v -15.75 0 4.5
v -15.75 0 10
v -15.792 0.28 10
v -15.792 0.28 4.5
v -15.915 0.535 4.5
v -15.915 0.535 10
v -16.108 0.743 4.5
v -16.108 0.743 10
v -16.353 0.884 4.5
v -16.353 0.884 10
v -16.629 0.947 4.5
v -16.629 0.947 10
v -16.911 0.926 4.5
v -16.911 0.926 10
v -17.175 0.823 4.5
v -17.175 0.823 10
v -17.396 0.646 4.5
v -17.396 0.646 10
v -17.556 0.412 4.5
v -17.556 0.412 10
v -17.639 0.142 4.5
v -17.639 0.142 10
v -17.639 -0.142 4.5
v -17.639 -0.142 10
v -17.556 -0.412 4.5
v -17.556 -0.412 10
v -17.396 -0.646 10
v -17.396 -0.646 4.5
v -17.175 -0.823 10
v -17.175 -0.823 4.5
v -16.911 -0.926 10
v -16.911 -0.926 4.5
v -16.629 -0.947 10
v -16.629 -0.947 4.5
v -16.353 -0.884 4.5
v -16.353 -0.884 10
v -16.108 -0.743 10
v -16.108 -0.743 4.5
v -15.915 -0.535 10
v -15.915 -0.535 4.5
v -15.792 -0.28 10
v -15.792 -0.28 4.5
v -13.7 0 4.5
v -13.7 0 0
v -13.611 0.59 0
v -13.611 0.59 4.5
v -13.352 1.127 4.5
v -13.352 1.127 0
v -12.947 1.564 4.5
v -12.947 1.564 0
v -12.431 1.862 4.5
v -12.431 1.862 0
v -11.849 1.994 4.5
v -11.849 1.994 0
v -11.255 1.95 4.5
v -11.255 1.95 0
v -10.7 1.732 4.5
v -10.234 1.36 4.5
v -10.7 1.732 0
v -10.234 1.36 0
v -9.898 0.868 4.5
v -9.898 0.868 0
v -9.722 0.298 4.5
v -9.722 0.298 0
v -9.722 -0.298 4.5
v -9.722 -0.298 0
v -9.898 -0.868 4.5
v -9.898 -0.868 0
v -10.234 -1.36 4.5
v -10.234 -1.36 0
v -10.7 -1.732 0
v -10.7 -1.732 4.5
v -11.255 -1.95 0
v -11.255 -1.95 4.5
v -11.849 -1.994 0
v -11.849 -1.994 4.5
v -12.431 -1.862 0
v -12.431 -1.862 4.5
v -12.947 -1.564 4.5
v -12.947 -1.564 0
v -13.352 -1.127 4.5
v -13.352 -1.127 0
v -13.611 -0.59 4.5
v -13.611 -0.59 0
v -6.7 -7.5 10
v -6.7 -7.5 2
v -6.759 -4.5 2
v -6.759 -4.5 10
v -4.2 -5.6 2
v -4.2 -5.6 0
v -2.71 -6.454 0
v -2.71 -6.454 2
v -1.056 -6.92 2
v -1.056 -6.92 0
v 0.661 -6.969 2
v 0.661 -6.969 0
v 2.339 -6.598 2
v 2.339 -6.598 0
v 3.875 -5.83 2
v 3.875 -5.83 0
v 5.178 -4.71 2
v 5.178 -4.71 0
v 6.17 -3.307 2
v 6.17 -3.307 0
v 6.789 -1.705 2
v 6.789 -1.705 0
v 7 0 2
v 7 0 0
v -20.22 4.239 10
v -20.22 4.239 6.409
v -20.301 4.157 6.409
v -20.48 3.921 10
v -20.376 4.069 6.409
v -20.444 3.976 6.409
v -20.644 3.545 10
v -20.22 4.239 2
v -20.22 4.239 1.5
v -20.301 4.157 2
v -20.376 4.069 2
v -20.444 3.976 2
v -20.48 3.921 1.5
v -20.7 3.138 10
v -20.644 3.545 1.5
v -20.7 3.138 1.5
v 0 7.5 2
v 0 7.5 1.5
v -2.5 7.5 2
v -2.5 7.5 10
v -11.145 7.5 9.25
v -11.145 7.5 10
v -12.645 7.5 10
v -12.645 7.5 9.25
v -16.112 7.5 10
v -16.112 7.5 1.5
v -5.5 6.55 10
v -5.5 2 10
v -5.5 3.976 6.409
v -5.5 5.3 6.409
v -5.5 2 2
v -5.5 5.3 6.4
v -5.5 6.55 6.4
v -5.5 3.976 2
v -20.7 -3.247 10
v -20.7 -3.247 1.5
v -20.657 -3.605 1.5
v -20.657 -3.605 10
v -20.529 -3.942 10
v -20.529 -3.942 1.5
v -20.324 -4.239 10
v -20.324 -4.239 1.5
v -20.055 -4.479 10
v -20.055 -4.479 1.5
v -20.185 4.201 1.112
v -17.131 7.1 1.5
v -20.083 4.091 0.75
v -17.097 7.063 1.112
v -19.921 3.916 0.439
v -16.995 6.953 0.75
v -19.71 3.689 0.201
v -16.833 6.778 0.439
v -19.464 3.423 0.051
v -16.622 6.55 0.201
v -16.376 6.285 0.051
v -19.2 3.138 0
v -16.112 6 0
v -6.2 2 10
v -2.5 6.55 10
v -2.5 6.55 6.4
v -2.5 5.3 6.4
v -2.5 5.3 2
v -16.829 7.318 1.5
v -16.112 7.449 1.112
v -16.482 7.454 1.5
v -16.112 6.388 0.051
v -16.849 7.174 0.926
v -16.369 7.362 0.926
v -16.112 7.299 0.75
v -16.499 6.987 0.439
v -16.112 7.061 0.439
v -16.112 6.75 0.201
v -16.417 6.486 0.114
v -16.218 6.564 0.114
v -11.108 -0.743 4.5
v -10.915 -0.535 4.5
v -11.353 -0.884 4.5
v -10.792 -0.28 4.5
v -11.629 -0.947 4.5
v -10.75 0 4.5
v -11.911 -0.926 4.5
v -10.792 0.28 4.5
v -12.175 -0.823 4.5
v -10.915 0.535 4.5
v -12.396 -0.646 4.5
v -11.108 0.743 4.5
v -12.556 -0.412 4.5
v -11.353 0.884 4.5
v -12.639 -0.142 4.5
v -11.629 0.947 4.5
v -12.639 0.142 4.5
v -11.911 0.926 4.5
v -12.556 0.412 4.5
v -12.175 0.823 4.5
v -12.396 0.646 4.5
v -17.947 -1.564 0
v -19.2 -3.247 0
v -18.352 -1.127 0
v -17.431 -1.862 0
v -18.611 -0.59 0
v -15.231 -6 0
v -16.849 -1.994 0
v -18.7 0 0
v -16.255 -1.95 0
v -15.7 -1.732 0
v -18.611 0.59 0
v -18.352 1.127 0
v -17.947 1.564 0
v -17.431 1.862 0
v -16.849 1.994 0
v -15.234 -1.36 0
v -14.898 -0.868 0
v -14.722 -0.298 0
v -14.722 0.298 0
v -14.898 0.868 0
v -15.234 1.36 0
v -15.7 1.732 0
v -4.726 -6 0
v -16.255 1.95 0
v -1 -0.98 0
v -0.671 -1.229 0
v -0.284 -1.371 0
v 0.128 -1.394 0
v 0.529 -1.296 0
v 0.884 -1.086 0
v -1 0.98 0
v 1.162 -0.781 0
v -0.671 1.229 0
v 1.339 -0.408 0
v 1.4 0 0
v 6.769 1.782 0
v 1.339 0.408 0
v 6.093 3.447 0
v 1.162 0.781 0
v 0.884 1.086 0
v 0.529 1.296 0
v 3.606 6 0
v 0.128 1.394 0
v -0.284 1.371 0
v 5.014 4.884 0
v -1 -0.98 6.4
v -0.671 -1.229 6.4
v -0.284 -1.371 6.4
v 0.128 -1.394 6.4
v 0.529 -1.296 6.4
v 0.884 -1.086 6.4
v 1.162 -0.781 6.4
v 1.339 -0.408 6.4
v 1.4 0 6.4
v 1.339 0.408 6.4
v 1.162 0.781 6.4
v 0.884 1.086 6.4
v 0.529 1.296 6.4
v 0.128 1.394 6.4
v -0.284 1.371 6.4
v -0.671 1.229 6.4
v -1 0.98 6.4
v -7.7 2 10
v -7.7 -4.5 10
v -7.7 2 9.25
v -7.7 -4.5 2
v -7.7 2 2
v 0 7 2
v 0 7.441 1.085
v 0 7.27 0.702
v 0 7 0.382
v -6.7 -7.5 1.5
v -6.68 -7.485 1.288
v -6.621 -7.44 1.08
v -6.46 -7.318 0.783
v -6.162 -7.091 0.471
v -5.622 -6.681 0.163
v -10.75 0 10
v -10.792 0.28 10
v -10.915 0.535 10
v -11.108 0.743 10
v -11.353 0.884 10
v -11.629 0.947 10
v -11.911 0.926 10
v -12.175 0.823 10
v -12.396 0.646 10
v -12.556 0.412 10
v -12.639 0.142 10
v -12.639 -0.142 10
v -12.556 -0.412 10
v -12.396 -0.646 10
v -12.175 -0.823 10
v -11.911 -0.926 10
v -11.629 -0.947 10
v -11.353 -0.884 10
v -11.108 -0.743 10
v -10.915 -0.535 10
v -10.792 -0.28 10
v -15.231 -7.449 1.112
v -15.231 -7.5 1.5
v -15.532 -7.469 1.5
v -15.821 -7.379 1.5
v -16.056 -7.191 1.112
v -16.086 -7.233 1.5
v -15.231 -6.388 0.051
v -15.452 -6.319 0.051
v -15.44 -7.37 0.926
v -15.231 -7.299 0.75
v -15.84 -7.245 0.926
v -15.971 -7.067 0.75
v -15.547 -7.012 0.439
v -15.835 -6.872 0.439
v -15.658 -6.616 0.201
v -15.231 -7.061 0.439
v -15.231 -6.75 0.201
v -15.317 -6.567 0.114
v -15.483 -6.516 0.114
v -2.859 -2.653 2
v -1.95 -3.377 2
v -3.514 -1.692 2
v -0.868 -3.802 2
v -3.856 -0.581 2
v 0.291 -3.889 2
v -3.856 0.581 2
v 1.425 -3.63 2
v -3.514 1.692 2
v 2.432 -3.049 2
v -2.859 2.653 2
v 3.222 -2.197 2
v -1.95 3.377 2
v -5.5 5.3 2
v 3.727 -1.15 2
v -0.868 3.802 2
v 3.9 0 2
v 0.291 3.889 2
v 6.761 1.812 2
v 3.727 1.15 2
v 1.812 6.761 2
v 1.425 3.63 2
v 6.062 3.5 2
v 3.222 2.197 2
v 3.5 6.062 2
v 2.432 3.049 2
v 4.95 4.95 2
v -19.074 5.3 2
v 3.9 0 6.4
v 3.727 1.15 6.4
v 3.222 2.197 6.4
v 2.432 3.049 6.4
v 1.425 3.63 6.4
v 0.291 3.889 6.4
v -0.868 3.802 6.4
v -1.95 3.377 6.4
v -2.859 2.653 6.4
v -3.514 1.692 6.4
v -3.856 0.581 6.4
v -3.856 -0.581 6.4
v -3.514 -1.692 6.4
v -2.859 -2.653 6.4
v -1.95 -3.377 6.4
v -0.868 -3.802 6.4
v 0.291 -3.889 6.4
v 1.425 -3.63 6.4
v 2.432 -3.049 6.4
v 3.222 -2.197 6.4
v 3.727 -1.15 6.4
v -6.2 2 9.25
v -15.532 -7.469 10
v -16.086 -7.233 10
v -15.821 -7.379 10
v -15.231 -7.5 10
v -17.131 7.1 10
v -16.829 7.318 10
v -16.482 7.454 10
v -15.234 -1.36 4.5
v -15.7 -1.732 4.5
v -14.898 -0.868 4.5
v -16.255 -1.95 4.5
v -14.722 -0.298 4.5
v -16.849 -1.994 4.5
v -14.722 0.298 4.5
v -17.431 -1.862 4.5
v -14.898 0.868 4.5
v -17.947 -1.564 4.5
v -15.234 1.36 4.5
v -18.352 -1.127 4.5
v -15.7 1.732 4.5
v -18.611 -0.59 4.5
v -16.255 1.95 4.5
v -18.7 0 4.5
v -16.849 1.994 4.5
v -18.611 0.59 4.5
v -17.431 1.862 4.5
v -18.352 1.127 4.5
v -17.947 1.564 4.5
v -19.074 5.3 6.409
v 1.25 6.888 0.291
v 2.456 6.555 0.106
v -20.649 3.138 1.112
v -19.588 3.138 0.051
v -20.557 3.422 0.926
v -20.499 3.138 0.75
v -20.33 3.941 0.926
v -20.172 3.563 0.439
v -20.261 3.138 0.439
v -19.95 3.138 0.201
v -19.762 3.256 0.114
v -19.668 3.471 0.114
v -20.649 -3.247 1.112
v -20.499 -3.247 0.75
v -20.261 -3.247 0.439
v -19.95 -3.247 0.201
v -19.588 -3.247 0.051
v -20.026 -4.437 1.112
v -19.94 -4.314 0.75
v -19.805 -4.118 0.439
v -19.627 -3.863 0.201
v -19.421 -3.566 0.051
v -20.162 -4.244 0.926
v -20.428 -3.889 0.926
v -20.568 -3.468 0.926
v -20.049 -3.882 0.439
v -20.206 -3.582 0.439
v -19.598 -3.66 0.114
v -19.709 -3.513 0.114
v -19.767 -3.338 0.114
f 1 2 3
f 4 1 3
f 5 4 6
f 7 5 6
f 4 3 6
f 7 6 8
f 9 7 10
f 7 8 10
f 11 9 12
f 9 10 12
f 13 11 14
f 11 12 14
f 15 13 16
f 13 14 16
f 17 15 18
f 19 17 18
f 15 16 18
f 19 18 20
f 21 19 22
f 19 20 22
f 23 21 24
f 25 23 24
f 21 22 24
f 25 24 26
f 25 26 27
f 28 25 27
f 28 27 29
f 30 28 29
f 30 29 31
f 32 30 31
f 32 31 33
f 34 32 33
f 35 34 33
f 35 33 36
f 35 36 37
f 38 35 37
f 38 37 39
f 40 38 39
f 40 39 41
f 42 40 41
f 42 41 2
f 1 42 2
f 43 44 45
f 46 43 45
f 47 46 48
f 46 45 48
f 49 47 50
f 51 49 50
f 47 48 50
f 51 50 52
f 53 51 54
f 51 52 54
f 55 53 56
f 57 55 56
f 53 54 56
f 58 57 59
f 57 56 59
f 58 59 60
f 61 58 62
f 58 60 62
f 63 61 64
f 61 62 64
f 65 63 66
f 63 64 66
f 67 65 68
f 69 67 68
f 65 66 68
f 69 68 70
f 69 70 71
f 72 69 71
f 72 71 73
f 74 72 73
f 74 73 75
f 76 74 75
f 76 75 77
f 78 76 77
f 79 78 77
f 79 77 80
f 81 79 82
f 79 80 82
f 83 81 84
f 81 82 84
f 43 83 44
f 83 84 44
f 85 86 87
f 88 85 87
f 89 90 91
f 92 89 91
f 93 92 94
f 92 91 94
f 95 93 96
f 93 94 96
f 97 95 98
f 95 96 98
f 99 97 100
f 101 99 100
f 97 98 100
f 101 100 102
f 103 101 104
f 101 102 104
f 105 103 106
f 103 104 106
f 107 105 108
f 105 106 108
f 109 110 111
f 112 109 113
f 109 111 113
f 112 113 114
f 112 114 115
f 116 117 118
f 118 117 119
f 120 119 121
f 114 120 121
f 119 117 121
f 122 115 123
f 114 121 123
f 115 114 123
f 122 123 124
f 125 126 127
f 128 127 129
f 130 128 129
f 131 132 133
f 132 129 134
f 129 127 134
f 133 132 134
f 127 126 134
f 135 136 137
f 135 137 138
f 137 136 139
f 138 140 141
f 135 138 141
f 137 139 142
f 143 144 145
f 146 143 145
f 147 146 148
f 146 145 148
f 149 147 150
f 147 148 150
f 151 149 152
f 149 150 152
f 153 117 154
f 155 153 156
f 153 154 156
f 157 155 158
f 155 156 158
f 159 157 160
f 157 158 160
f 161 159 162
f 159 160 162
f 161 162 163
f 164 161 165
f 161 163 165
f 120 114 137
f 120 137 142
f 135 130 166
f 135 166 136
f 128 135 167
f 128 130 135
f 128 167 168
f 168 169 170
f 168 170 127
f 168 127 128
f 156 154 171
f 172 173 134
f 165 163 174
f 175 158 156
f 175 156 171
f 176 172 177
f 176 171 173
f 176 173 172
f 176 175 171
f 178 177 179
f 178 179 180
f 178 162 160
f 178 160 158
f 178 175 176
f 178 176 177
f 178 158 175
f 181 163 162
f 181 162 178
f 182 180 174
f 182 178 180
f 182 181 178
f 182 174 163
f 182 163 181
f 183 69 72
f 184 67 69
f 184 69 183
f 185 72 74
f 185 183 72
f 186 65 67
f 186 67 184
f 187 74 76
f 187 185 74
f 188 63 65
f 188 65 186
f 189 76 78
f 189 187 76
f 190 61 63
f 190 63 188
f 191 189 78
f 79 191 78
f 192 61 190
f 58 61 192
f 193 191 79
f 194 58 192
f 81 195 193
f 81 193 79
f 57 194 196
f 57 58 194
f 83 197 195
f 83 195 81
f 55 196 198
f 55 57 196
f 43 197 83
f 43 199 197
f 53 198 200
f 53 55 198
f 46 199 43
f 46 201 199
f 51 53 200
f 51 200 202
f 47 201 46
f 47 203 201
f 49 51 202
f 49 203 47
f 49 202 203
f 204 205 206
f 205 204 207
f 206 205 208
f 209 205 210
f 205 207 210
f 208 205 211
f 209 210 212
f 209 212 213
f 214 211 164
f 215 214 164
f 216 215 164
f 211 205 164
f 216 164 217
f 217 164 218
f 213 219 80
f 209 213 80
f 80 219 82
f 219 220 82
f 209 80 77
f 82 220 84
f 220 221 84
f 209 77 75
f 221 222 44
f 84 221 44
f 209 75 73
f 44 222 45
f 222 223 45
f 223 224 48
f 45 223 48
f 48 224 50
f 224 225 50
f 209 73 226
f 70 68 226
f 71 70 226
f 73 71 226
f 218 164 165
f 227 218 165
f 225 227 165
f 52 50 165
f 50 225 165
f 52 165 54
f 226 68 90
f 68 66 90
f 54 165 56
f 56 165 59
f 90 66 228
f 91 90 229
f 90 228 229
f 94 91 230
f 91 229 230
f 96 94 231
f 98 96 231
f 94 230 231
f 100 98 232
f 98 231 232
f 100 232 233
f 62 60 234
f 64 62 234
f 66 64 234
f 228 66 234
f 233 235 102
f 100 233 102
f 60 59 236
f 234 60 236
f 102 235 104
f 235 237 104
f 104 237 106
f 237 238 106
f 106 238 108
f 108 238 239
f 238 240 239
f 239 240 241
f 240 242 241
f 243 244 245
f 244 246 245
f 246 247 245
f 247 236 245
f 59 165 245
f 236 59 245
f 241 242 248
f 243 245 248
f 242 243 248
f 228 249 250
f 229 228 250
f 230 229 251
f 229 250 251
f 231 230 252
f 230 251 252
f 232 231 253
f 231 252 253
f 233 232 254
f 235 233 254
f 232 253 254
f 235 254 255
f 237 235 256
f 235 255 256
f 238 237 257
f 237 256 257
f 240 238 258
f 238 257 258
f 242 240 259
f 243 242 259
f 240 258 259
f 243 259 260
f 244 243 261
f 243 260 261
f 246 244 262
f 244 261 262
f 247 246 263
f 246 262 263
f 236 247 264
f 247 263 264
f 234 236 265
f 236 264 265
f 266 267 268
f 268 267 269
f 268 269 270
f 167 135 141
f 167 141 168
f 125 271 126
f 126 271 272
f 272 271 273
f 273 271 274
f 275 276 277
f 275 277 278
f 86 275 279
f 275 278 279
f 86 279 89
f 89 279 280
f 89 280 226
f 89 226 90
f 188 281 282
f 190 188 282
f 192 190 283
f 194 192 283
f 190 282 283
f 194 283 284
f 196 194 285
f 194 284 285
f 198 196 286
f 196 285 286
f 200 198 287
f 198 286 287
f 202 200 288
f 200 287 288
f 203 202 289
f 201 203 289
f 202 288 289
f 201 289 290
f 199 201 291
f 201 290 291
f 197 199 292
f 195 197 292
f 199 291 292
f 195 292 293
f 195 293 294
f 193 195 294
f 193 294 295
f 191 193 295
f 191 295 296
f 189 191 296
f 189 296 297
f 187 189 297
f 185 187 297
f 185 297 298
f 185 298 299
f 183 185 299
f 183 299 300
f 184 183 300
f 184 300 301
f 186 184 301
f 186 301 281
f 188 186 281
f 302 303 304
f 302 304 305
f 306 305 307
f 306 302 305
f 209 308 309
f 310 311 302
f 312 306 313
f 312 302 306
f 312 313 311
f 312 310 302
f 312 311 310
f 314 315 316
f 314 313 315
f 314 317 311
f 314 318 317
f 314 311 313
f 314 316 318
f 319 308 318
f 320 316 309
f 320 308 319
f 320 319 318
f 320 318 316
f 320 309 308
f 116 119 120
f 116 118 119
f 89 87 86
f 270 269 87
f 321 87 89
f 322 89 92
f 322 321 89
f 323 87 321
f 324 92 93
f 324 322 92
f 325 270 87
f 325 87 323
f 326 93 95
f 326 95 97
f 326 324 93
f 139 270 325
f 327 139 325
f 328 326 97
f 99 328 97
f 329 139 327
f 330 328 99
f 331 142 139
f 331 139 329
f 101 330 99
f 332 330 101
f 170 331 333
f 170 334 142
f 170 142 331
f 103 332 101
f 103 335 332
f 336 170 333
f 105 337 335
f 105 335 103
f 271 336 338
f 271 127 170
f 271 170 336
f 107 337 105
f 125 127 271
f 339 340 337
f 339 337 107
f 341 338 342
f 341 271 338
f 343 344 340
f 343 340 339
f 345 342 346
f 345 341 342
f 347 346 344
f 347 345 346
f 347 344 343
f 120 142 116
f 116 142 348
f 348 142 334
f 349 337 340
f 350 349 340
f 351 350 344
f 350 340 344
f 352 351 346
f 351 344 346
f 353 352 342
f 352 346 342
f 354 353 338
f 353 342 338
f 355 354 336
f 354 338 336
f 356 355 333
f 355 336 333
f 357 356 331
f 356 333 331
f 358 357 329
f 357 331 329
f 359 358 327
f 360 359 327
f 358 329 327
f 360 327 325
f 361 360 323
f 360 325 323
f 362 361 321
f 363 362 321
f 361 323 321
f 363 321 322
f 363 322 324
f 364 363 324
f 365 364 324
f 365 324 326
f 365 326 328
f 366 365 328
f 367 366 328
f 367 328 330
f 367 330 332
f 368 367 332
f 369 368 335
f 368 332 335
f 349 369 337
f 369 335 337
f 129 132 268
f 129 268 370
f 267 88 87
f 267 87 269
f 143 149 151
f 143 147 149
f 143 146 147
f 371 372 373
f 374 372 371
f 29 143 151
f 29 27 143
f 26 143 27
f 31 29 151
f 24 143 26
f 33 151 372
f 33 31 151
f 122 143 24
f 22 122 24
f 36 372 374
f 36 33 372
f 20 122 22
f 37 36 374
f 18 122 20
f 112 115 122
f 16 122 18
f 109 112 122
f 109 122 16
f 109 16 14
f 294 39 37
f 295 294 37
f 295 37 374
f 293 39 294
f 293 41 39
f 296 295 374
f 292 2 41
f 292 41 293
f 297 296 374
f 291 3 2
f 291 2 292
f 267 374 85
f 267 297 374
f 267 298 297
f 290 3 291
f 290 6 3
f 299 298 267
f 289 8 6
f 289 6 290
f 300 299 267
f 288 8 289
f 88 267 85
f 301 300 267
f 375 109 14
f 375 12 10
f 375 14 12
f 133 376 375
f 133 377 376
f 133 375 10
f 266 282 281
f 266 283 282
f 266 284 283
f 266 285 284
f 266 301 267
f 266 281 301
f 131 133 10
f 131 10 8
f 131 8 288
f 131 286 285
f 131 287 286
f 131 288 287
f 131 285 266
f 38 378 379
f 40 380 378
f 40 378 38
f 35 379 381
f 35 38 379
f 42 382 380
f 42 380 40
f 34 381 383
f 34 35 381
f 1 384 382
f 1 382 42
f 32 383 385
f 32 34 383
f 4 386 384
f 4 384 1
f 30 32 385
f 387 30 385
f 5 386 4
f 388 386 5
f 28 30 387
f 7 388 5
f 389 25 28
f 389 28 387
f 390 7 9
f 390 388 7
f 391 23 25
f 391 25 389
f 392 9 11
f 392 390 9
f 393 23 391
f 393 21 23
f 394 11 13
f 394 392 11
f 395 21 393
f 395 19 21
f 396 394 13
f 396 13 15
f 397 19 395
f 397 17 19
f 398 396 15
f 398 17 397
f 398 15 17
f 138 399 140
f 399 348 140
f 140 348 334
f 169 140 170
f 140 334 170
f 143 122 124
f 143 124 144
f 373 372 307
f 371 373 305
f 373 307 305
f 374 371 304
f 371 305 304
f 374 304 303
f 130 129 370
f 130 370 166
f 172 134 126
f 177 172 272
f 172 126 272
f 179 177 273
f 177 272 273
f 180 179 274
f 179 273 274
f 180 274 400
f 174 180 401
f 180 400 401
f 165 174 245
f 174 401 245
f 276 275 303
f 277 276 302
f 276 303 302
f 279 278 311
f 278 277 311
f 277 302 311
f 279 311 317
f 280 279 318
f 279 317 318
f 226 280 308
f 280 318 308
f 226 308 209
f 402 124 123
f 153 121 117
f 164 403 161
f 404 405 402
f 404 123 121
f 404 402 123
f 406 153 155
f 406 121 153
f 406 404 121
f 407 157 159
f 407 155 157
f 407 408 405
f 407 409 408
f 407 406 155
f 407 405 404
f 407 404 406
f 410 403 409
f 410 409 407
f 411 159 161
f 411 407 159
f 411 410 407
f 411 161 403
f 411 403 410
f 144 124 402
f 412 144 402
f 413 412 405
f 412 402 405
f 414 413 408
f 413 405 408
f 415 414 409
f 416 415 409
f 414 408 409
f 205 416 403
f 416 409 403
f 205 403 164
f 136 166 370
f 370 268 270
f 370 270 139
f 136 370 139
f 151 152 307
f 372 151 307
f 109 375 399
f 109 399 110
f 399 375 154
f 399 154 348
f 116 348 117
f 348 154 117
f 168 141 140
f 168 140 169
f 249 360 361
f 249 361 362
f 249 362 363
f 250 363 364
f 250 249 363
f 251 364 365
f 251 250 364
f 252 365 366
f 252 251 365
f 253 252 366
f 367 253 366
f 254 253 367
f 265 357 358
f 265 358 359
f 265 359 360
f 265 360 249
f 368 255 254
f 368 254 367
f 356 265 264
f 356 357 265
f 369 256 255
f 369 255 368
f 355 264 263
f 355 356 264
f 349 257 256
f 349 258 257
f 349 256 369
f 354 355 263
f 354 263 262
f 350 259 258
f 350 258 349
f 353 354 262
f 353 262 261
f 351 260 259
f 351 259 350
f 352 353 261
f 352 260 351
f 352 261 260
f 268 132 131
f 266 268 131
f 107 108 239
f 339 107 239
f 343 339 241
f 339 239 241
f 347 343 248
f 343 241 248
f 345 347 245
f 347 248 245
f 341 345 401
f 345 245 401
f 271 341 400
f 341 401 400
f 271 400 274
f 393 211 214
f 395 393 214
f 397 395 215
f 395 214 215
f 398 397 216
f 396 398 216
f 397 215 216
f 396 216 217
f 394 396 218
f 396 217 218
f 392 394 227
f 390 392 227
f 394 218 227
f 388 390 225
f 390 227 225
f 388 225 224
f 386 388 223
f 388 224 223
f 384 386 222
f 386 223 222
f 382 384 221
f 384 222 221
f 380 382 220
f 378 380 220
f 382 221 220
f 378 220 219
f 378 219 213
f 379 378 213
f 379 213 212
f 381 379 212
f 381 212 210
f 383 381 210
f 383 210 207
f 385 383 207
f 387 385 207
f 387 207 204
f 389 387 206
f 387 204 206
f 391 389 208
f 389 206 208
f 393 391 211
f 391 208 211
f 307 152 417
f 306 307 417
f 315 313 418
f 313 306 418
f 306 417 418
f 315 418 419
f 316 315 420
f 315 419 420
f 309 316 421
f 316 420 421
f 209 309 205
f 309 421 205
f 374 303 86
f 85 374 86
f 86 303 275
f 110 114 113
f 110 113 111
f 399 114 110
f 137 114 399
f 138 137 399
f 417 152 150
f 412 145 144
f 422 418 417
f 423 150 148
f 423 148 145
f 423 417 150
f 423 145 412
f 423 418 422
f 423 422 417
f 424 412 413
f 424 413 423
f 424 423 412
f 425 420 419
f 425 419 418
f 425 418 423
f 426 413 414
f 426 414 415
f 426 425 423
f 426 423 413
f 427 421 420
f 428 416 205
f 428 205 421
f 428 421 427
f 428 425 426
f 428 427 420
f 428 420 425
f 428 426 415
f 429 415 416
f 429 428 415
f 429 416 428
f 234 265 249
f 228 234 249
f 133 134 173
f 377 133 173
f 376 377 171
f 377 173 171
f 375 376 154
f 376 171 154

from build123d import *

# Parameters (mm, degrees)
BOSS_EXTRUDE1_DEPTH = 2
BOSS_EXTRUDE2_DEPTH = 8
SKETCH24_R          = 3.9
BOSS_EXTRUDE5_DEPTH = 4.4
SKETCH30_W          = 4.40861202
SKETCH30_H          = 1.324178481
CUT_EXTRUDE12_DEPTH = 16
CUT_EXTRUDE11_DEPTH = 23.928148639
FILLET1_R           = 1.5
SKETCH34_W          = 1.5
SKETCH34_H          = 1.5
CUT_EXTRUDE13_DEPTH = 8
SKETCH36_R          = 0.95
CUT_EXTRUDE15_DEPTH = 8
SKETCH37_R          = 2
CUT_EXTRUDE16_DEPTH = 4.5
SKETCH38_W          = 3
SKETCH38_H          = 1.25
CUT_EXTRUDE17_DEPTH = 3.6


with BuildPart() as part:
    # Sketch2 → Boss-Extrude1 (new body)
    with BuildSketch(Plane.XY):
        with BuildLine():
            Line((-2.5, 7.5), (-16.7, 7.5))
            Line((-16.7, 7.5), (-20.7, 3.793442666))
            Line((-20.7, 3.793442666), (-20.7, -4.031648778))
            Line((-20.7, -4.031648778), (-15.7, -7.5))
            Line((-15.7, -7.5), (-6.7, -7.5))
            Line((-6.7, -7.5), (-4.2, -5.6))
            ThreePointArc((-4.2, -5.6), (3.130495168, -6.260990337), (7, 0))
            ThreePointArc((7, 0), (4.949747468, 4.949747468), (0, 7))
            Line((0, 7), (0, 7.5))
            Line((0, 7.5), (-2.5, 7.5))
        make_face()
    extrude(amount=BOSS_EXTRUDE1_DEPTH)

    # Sketch4 → Boss-Extrude2 (add)
    with BuildSketch(Plane.XY.offset(2)):
        Polygon((-15.7, -7.5), (-6.7, -7.5), (-6.759079174, -4.5), (-7.7, -4.5), (-7.7, 2), (-5.5, 2), (-5.5, 5.3), (-2.5, 5.3), (-2.5, 7.5), (-16.7, 7.5), (-20.7, 3.793442666), (-20.7, -4.031648778), align=None)
    extrude(amount=BOSS_EXTRUDE2_DEPTH)

    # Sketch24 → Boss-Extrude5 (add)
    with BuildSketch(Plane.XY.offset(2)):
        Circle(SKETCH24_R)
    extrude(amount=BOSS_EXTRUDE5_DEPTH)

    # Sketch30 → Cut-Extrude12 (cut)
    with BuildSketch(Plane(origin=(-5.5, 0, 0), x_dir=(0, 0, -1), z_dir=(1, 0, 0))):
        with Locations((-4.20430601, 4.63791076)):
            Rectangle(SKETCH30_W, SKETCH30_H)
    extrude(amount=-CUT_EXTRUDE12_DEPTH, mode=Mode.SUBTRACT)

    # Sketch28 → Cut-Extrude11 (cut, through all)
    with BuildSketch(Plane.XY.offset(6.4)):
        with BuildLine():
            Line((-1, 0.979795897), (-1, -0.979795897))
            ThreePointArc((-1, -0.979795897), (1.4, 0), (-1, 0.979795897))
        make_face()
    extrude(amount=-CUT_EXTRUDE11_DEPTH, mode=Mode.SUBTRACT)

    # Fillet1
    # the kernel refuses this fillet: 1.5 mm, written as the material it takes off along each edge
    with BuildSketch(Plane(origin=(-15.230677435, -6, 1.5), x_dir=(-0.5699665637840448, -0.8216678867816415, 0), z_dir=(0, 0, -1))) as fillet1_piece_1_section:
        Polygon((0, 0), (FILLET1_R * 1.02, 0), (FILLET1_R * 1.02, -FILLET1_R * 0.319139344377), (FILLET1_R * 0.838101244517, -FILLET1_R * 0.58136589506), align=None)
    fillet1_piece_1 = extrude(amount=FILLET1_R * 1.02, mode=Mode.PRIVATE)
    fillet1_piece_1 = fillet1_piece_1 - Plane(origin=(-15.230677435, -6, 1.5), x_dir=(0.29860685961507855, 0.9543762064253388, 0), z_dir=(0, 0, -1)) * Sphere(FILLET1_R, mode=Mode.PRIVATE)
    add(fillet1_piece_1, mode=Mode.SUBTRACT)
    with BuildSketch(Plane(origin=(-16.11186344, 6, 1.5), x_dir=(-0.6796897201843015, 0.7334997506991983, 0), z_dir=(0, 0, -1))) as fillet1_piece_2_section:
        Polygon((0, 0), (FILLET1_R * 1.02, 0), (FILLET1_R * 1.02, FILLET1_R * 0.399932860855), (FILLET1_R * 0.748169745713, FILLET1_R * 0.693283514588), align=None)
    fillet1_piece_2 = extrude(amount=FILLET1_R * 1.02, mode=Mode.PRIVATE)
    fillet1_piece_2 = fillet1_piece_2 - Plane(origin=(-16.11186344, 6, 1.5), x_dir=(0.3650344157067945, -0.9309940254102596, 0), z_dir=(0, 0, -1)) * Sphere(FILLET1_R, mode=Mode.PRIVATE)
    add(fillet1_piece_2, mode=Mode.SUBTRACT)
    with BuildSketch(Plane(origin=(-19.2, 3.138411196, 1.5), x_dir=(-0.6796897201843015, 0.7334997506991983, 0), z_dir=(0, 0, -1))) as fillet1_piece_3_section:
        Polygon((0, 0), (FILLET1_R * 1.02, 0), (FILLET1_R * 1.02, -FILLET1_R * 0.445421399395), (FILLET1_R * 0.693283514588, -FILLET1_R * 0.748169745713), align=None)
    fillet1_piece_3 = extrude(amount=FILLET1_R * 1.02, mode=Mode.PRIVATE)
    fillet1_piece_3 = fillet1_piece_3 - Plane(origin=(-19.2, 3.138411196, 1.5), x_dir=(0.9164304993244992, -0.40019387789901173, 0), z_dir=(0, 0, -1)) * Sphere(FILLET1_R, mode=Mode.PRIVATE)
    add(fillet1_piece_3, mode=Mode.SUBTRACT)
    with BuildSketch(Plane(origin=(-19.2, -3.246599046, 1.5), x_dir=(-0.5699665637840448, -0.8216678867816415, 0), z_dir=(0, 0, -1))) as fillet1_piece_4_section:
        Polygon((0, 0), (FILLET1_R * 1.02, 0), (FILLET1_R * 1.02, FILLET1_R * 0.533833817771), (FILLET1_R * 0.58136589506, FILLET1_R * 0.838101244517), align=None)
    fillet1_piece_4 = extrude(amount=FILLET1_R * 1.02, mode=Mode.PRIVATE)
    fillet1_piece_4 = fillet1_piece_4 - Plane(origin=(-19.2, -3.246599046, 1.5), x_dir=(0.8859928227090906, 0.46369895202380795, 0), z_dir=(0, 0, -1)) * Sphere(FILLET1_R, mode=Mode.PRIVATE)
    add(fillet1_piece_4, mode=Mode.SUBTRACT)
    with BuildSketch(Plane(origin=(-15.230677435, -7.5, 0), x_dir=(0, 1, 0), z_dir=(1, 0, 0))) as fillet1_piece_5_section:
        with BuildLine():
            CenterArc((FILLET1_R, FILLET1_R), FILLET1_R, 180, 90)
            Line((0, FILLET1_R), (0, 0))
            Line((0, 0), (FILLET1_R, 0))
        make_face()
    fillet1_piece_5 = extrude(amount=12.280677435, mode=Mode.PRIVATE)
    fillet1_piece_5 = split(fillet1_piece_5, bisect_by=Plane(origin=(-9.092127217, -9.318016685, 0.3282266), z_dir=(-0.6050832675335577, 0.7961621941231027, 0)), keep=Keep.TOP, mode=Mode.PRIVATE)
    add(fillet1_piece_5, mode=Mode.SUBTRACT)
    with BuildSketch(Plane(origin=(3.75, 7.5, 0), x_dir=(0, 0, 1), z_dir=(-1, 0, 0))) as fillet1_piece_6:
        with BuildLine():
            CenterArc((FILLET1_R, -FILLET1_R), FILLET1_R, 90, 90)
            Line((0, -FILLET1_R), (0, 0))
            Line((0, 0), (FILLET1_R, 0))
        make_face()
    extrude(amount=19.86186344, mode=Mode.SUBTRACT)
    with BuildSketch(Plane(origin=(-17.13139802, 7.100249626, 0), x_dir=(0.6796897201843014, -0.7334997506991981, 0), z_dir=(-0.7334997506991983, -0.6796897201843015, 0))) as fillet1_piece_7:
        with BuildLine():
            CenterArc((FILLET1_R, FILLET1_R), FILLET1_R, 180, 90)
            Line((0, FILLET1_R), (0, 0))
            Line((0, 0), (FILLET1_R, 0))
        make_face()
    extrude(amount=4.21013989, mode=Mode.SUBTRACT)
    with BuildSketch(Plane(origin=(-20.054949846, -4.479100876, 0), x_dir=(0.5699665637840448, 0.8216678867816416, 0), z_dir=(0.8216678867816415, -0.5699665637840448, 0))) as fillet1_piece_8:
        with BuildLine():
            CenterArc((FILLET1_R, FILLET1_R), FILLET1_R, 180, 90)
            Line((0, FILLET1_R), (0, 0))
            Line((0, 0), (FILLET1_R, 0))
        make_face()
    extrude(amount=4.830811364, mode=Mode.SUBTRACT)
    with BuildSketch(Plane(origin=(-20.7, 3.138411196, 0), x_dir=(1, 0, 0), z_dir=(0, -1, 0))) as fillet1_piece_9:
        with BuildLine():
            CenterArc((FILLET1_R, FILLET1_R), FILLET1_R, 180, 90)
            Line((0, FILLET1_R), (0, 0))
            Line((0, 0), (FILLET1_R, 0))
        make_face()
    extrude(amount=6.385010242, mode=Mode.SUBTRACT)
    with BuildSketch(Plane(origin=(-15.7, -7.5, 1.5), x_dir=(1, 0, 0), z_dir=(0, 0, 1))) as fillet1_piece_10:
        with BuildLine():
            CenterArc((FILLET1_R * 0.312881710173, FILLET1_R), FILLET1_R, 235.252105822, 34.747894178)
            Line((-FILLET1_R * 0.257084853611, FILLET1_R * 0.178332113218), (0, 0))
            Line((0, 0), (FILLET1_R * 0.312881710173, 0))
        make_face()
    extrude(amount=9.673306413, mode=Mode.SUBTRACT)
    with BuildSketch(Plane(origin=(-20.7, -4.031648778, 1.5), x_dir=(0, 1, 0), z_dir=(0, 0, 1))) as fillet1_piece_11:
        with BuildLine():
            CenterArc((FILLET1_R * 0.523366488011, -FILLET1_R), FILLET1_R, 90, 55.252105822)
            Line((-FILLET1_R * 0.298301398771, -FILLET1_R * 0.430033436216), (0, 0))
            Line((0, 0), (FILLET1_R * 0.523366488011, 0))
        make_face()
    extrude(amount=10.46262433, mode=Mode.SUBTRACT)
    with BuildSketch(Plane(origin=(-20.7, 3.793442666, 1.5), x_dir=(0.7334997506991984, 0.6796897201843014, 0), z_dir=(0, 0, 1))) as fillet1_piece_12:
        with BuildLine():
            CenterArc((FILLET1_R * 0.436687646465, -FILLET1_R), FILLET1_R, 90, 47.18059856)
            Line((-FILLET1_R * 0.296812104234, -FILLET1_R * 0.320310279816), (0, 0))
            Line((0, 0), (FILLET1_R * 0.436687646465, 0))
        make_face()
    extrude(amount=10.137578674, mode=Mode.SUBTRACT)
    with BuildSketch(Plane(origin=(-16.7, 7.5, 1.5), x_dir=(1, 0, 0), z_dir=(0, 0, 1))) as fillet1_piece_13:
        with BuildLine():
            CenterArc((FILLET1_R * 0.392091040054, -FILLET1_R), FILLET1_R, 90, 42.81940144)
            Line((-FILLET1_R * 0.287598680131, -FILLET1_R * 0.266500249301), (0, 0))
            Line((0, 0), (FILLET1_R * 0.392091040054, 0))
        make_face()
    extrude(amount=9.9703414, mode=Mode.SUBTRACT)

    # Sketch34 → Cut-Extrude13 (cut, along a direction that is not the sketch's normal)
    with BuildSketch(Plane.XZ.offset(-2)):
        with Locations((-6.95, 10)):
            Rectangle(SKETCH34_W, SKETCH34_H)
    extrude(amount=-CUT_EXTRUDE13_DEPTH, dir=(0.6685833876565112, -0.7436371788377336, 0), mode=Mode.SUBTRACT)

    # Sketch36 → Cut-Extrude15 (cut)
    with BuildSketch(Plane.XY.offset(10)):
        with Locations((-11.7, 0)):
            Circle(SKETCH36_R)
        with Locations((-16.7, 0)):
            Circle(SKETCH36_R)
    extrude(amount=-CUT_EXTRUDE15_DEPTH, mode=Mode.SUBTRACT)

    # Sketch37 → Cut-Extrude16 (cut)
    with BuildSketch(Plane(origin=(0, 0, 0), x_dir=(-1, 0, 0), z_dir=(0, 0, -1))):
        with Locations((11.7, 0)):
            Circle(SKETCH37_R)
        with Locations((16.7, 0)):
            Circle(SKETCH37_R)
    extrude(amount=-CUT_EXTRUDE16_DEPTH, mode=Mode.SUBTRACT)

    # Sketch38 → Cut-Extrude17 (cut)
    with BuildSketch(Plane.XY.offset(10)):
        with Locations((-4, 5.925)):
            Rectangle(SKETCH38_W, SKETCH38_H)
    extrude(amount=-CUT_EXTRUDE17_DEPTH, mode=Mode.SUBTRACT)


solid = part.part
